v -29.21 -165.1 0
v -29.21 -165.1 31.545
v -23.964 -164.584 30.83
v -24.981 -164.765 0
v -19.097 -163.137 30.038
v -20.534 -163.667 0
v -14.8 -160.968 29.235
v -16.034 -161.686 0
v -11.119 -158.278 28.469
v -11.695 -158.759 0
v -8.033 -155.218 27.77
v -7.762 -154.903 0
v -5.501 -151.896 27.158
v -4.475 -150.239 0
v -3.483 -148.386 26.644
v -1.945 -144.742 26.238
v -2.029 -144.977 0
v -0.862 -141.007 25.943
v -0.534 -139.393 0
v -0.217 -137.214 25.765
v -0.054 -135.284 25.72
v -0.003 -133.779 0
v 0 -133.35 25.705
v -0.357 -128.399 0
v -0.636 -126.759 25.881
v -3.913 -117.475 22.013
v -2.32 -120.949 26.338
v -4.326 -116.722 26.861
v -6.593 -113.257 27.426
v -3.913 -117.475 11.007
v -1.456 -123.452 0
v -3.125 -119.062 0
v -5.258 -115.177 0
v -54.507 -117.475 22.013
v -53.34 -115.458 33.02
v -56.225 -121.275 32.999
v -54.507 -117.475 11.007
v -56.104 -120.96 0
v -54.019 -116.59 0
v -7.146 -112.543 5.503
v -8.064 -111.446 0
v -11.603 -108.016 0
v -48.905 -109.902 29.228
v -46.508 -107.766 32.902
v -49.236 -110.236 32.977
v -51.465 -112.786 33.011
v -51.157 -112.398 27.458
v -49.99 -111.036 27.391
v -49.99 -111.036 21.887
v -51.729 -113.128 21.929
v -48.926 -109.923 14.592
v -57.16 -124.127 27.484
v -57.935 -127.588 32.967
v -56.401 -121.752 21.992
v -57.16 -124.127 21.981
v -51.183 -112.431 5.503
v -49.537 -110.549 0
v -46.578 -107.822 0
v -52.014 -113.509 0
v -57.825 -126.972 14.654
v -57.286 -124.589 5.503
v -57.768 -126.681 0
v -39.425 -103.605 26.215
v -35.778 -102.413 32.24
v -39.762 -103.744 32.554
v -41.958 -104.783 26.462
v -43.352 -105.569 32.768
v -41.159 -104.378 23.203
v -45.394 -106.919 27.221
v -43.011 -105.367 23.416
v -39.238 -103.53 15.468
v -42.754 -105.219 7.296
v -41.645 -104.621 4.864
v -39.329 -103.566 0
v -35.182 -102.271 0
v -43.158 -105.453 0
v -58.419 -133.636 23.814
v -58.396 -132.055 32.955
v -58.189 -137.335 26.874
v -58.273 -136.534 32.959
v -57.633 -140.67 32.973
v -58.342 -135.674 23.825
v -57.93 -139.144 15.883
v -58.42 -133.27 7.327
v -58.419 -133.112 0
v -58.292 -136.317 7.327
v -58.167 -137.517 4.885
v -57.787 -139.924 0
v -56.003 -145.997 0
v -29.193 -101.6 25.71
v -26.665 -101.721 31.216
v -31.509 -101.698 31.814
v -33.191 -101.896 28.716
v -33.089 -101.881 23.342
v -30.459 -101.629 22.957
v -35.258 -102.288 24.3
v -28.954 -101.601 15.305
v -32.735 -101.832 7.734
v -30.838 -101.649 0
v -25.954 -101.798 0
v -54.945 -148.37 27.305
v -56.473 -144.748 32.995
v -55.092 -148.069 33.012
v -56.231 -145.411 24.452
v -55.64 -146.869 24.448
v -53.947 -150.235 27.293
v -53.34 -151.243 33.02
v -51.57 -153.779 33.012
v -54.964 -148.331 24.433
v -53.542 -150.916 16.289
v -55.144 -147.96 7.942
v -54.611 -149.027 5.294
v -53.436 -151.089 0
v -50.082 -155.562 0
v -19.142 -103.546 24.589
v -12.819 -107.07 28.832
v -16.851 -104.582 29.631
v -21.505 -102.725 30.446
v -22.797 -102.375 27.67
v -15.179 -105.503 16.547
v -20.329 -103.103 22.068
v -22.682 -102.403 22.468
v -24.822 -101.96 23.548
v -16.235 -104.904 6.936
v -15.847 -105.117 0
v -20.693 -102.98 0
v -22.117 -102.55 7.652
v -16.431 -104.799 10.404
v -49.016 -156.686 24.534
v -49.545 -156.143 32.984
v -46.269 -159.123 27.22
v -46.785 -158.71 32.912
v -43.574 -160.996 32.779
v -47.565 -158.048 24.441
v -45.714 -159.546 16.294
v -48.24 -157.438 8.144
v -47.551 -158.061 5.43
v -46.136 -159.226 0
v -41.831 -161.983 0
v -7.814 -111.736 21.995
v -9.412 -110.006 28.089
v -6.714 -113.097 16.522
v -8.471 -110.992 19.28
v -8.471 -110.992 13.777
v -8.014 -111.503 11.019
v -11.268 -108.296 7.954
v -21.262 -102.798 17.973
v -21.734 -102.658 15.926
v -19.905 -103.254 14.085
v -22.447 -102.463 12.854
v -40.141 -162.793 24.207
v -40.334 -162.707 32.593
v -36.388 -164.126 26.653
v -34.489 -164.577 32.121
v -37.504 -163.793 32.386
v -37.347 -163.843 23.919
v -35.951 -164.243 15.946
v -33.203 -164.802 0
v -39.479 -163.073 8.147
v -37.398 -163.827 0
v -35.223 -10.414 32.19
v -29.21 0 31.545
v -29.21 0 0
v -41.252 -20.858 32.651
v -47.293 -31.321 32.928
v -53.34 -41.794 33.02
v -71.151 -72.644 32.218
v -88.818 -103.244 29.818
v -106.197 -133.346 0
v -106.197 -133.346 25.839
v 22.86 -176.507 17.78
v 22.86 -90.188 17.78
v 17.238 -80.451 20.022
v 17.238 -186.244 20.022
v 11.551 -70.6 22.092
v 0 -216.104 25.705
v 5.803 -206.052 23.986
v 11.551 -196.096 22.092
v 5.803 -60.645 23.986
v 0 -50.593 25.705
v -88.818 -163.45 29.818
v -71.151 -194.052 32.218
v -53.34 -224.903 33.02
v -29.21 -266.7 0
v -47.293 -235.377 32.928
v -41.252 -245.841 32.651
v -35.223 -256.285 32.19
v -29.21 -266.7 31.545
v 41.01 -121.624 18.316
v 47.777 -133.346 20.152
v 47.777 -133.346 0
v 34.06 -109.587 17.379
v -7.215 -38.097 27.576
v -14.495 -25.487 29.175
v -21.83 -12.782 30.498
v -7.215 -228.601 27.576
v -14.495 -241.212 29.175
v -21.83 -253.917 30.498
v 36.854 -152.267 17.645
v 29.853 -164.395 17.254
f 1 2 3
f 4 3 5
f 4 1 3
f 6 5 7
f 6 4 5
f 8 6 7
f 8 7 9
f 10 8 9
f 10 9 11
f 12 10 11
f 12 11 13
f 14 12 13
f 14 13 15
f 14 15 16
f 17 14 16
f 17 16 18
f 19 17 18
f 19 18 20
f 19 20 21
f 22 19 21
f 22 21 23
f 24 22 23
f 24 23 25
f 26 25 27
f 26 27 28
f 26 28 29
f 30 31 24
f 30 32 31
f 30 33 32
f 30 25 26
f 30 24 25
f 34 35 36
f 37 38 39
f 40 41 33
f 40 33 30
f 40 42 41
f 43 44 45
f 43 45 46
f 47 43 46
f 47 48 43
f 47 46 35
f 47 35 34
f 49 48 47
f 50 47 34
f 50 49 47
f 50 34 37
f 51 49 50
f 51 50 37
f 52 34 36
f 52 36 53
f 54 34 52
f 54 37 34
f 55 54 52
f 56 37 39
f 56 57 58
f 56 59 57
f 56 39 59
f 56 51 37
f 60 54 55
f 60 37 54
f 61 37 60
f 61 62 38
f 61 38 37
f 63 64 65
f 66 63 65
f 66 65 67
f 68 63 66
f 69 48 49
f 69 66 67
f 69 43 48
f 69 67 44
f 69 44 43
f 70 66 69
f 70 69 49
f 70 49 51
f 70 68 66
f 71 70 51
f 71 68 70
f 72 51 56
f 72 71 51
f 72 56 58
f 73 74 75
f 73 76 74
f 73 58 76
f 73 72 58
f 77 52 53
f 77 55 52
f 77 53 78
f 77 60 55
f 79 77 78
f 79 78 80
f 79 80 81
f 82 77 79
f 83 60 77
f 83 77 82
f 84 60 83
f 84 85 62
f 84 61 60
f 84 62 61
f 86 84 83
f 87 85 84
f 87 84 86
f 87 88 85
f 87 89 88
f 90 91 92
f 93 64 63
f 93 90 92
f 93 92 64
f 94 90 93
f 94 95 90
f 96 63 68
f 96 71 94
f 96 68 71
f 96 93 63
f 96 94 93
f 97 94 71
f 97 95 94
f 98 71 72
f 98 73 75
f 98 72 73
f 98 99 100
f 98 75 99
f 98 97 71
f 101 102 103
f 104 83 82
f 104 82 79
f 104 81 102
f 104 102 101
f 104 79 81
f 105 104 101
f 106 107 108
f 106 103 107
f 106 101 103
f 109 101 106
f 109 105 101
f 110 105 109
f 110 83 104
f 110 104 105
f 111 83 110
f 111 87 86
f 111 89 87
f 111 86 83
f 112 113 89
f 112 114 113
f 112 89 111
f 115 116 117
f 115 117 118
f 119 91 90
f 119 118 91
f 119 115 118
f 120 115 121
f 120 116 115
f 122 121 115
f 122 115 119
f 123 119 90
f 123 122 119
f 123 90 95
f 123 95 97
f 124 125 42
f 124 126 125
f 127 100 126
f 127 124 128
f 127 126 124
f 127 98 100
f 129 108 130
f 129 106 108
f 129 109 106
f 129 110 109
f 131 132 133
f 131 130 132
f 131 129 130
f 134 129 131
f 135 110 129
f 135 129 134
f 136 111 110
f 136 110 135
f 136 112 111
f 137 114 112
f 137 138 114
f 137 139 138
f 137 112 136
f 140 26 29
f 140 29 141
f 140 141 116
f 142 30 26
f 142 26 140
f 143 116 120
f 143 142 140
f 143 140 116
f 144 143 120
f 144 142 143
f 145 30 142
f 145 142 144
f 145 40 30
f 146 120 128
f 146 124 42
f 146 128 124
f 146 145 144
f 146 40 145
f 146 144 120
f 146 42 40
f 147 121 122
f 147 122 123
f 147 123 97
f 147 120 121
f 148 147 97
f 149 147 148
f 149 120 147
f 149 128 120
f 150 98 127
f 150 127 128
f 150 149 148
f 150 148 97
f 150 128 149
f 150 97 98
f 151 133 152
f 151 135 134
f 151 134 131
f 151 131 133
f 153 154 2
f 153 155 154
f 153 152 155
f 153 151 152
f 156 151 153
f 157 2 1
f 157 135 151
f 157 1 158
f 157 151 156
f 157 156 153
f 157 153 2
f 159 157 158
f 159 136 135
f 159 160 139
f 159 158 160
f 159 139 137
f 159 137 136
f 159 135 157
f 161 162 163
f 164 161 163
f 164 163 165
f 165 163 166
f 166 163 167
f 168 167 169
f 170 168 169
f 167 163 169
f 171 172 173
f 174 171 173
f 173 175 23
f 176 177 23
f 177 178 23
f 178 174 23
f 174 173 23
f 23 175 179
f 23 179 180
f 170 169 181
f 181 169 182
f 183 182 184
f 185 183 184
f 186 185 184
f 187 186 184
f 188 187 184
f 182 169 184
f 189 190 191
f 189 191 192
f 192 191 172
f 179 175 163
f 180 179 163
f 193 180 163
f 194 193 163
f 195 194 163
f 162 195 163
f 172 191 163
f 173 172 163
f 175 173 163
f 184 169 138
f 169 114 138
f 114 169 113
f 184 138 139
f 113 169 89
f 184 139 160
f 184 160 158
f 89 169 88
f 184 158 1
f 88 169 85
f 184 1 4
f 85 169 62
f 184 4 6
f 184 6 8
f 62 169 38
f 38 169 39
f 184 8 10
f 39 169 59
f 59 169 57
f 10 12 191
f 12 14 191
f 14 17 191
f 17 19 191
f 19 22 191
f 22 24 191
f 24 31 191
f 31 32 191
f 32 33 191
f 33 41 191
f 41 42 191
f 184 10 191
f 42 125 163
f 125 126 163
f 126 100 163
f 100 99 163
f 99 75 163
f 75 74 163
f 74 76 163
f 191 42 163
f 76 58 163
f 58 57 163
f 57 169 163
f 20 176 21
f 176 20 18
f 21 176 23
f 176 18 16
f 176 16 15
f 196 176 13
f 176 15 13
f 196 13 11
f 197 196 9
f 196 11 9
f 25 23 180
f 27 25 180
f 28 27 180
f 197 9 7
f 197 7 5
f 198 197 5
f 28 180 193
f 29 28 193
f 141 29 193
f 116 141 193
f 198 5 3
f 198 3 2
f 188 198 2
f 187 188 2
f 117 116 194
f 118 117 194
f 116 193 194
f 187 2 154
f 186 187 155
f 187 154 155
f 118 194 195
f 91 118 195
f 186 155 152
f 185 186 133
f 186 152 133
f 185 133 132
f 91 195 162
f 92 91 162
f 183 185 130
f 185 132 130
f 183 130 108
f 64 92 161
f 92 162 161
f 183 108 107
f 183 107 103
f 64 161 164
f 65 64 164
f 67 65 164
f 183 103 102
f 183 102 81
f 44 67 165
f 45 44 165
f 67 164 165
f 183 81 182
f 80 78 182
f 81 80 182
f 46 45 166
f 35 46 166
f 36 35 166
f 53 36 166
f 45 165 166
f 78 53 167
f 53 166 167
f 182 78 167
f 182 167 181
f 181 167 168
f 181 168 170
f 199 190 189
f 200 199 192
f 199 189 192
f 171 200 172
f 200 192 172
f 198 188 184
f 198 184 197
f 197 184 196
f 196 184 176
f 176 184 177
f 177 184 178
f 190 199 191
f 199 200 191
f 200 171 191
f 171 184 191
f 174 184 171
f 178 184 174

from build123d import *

# Parameters (mm, degrees)
F1_DEPTH = 266.7
F2_DEPTH = 266.7
F4_DEPTH = 33.02


with BuildPart() as f1:
    # F0 (on Front) → F1 (new body)
    with BuildSketch(Plane.XZ):
        with BuildLine():
            ThreePointArc((48.2600185156, 20.32), (35.7132010039, 17.5181751166), (22.8600185156, 17.78))
            ThreePointArc((22.8600185156, 17.78), (11.5511007159, 22.0915645826), (1.85156e-05, 25.7045565494))
            Line((1.85156e-05, 25.7045565494), (1.85156e-05, 0))
            Line((1.85156e-05, 0), (48.2600185156, 0))
            Line((48.2600185156, 0), (48.2600185156, 20.32))
        make_face()
        with BuildLine():
            Line((1.85156e-05, 0), (1.85156e-05, 25.7045565494))
            ThreePointArc((1.85156e-05, 25.7045565494), (-65.4372766005, 32.6503219994), (-129.5399814844, 17.78))
            Line((-129.5399814844, 17.78), (-129.5399814844, 0))
            Line((-129.5399814844, 0), (1.85156e-05, 0))
        make_face()
    extrude(amount=F1_DEPTH)

    # F0 (on Front) → F2 (join)
    with BuildSketch(Plane.XZ):
        with BuildLine():
            ThreePointArc((48.2600185156, 20.32), (35.7132010039, 17.5181751166), (22.8600185156, 17.78))
            ThreePointArc((22.8600185156, 17.78), (11.5511007159, 22.0915645826), (1.85156e-05, 25.7045565494))
            Line((1.85156e-05, 25.7045565494), (1.85156e-05, 0))
            Line((1.85156e-05, 0), (48.2600185156, 0))
            Line((48.2600185156, 0), (48.2600185156, 20.32))
        make_face()
        with BuildLine():
            Line((1.85156e-05, 0), (1.85156e-05, 25.7045565494))
            ThreePointArc((1.85156e-05, 25.7045565494), (-65.4372766005, 32.6503219994), (-129.5399814844, 17.78))
            Line((-129.5399814844, 17.78), (-129.5399814844, 0))
            Line((-129.5399814844, 0), (1.85156e-05, 0))
        make_face()
    extrude(amount=F2_DEPTH)


with BuildPart() as f4:
    # F3 (on Top) → F4 (new body)
    with BuildSketch(Plane.XY):
        Polygon((47.7774130199, -133.3460956812), (-29.2099869801, -7.3386e-06), (-106.1973869801, -133.3460956812), (-29.2099869801, -266.7000073386), align=None)
        with BuildLine():
            add(Edge.make_bspline(
                [(-29.2099869801, -165.1000073386), (21.383217109, -165.1000073386), (-3.9133849355, -117.4750073386), (-29.2099869801, -69.8500073386), (-54.5065890246, -117.4750073386), (-79.8031910691, -165.1000073386), (-29.2099869801, -165.1000073386)],
                knots=[0, 0, 0, 2.0943951024, 2.0943951024, 4.1887902048, 4.1887902048, 6.2831853072, 6.2831853072, 6.2831853072], degree=2, weights=[1, 0.5, 1, 0.5, 1, 0.5, 1]))
        make_face(mode=Mode.SUBTRACT)
    extrude(amount=F4_DEPTH)

    # F5: intersect F1
    add(f1.part, mode=Mode.INTERSECT)


solid = f4.part
